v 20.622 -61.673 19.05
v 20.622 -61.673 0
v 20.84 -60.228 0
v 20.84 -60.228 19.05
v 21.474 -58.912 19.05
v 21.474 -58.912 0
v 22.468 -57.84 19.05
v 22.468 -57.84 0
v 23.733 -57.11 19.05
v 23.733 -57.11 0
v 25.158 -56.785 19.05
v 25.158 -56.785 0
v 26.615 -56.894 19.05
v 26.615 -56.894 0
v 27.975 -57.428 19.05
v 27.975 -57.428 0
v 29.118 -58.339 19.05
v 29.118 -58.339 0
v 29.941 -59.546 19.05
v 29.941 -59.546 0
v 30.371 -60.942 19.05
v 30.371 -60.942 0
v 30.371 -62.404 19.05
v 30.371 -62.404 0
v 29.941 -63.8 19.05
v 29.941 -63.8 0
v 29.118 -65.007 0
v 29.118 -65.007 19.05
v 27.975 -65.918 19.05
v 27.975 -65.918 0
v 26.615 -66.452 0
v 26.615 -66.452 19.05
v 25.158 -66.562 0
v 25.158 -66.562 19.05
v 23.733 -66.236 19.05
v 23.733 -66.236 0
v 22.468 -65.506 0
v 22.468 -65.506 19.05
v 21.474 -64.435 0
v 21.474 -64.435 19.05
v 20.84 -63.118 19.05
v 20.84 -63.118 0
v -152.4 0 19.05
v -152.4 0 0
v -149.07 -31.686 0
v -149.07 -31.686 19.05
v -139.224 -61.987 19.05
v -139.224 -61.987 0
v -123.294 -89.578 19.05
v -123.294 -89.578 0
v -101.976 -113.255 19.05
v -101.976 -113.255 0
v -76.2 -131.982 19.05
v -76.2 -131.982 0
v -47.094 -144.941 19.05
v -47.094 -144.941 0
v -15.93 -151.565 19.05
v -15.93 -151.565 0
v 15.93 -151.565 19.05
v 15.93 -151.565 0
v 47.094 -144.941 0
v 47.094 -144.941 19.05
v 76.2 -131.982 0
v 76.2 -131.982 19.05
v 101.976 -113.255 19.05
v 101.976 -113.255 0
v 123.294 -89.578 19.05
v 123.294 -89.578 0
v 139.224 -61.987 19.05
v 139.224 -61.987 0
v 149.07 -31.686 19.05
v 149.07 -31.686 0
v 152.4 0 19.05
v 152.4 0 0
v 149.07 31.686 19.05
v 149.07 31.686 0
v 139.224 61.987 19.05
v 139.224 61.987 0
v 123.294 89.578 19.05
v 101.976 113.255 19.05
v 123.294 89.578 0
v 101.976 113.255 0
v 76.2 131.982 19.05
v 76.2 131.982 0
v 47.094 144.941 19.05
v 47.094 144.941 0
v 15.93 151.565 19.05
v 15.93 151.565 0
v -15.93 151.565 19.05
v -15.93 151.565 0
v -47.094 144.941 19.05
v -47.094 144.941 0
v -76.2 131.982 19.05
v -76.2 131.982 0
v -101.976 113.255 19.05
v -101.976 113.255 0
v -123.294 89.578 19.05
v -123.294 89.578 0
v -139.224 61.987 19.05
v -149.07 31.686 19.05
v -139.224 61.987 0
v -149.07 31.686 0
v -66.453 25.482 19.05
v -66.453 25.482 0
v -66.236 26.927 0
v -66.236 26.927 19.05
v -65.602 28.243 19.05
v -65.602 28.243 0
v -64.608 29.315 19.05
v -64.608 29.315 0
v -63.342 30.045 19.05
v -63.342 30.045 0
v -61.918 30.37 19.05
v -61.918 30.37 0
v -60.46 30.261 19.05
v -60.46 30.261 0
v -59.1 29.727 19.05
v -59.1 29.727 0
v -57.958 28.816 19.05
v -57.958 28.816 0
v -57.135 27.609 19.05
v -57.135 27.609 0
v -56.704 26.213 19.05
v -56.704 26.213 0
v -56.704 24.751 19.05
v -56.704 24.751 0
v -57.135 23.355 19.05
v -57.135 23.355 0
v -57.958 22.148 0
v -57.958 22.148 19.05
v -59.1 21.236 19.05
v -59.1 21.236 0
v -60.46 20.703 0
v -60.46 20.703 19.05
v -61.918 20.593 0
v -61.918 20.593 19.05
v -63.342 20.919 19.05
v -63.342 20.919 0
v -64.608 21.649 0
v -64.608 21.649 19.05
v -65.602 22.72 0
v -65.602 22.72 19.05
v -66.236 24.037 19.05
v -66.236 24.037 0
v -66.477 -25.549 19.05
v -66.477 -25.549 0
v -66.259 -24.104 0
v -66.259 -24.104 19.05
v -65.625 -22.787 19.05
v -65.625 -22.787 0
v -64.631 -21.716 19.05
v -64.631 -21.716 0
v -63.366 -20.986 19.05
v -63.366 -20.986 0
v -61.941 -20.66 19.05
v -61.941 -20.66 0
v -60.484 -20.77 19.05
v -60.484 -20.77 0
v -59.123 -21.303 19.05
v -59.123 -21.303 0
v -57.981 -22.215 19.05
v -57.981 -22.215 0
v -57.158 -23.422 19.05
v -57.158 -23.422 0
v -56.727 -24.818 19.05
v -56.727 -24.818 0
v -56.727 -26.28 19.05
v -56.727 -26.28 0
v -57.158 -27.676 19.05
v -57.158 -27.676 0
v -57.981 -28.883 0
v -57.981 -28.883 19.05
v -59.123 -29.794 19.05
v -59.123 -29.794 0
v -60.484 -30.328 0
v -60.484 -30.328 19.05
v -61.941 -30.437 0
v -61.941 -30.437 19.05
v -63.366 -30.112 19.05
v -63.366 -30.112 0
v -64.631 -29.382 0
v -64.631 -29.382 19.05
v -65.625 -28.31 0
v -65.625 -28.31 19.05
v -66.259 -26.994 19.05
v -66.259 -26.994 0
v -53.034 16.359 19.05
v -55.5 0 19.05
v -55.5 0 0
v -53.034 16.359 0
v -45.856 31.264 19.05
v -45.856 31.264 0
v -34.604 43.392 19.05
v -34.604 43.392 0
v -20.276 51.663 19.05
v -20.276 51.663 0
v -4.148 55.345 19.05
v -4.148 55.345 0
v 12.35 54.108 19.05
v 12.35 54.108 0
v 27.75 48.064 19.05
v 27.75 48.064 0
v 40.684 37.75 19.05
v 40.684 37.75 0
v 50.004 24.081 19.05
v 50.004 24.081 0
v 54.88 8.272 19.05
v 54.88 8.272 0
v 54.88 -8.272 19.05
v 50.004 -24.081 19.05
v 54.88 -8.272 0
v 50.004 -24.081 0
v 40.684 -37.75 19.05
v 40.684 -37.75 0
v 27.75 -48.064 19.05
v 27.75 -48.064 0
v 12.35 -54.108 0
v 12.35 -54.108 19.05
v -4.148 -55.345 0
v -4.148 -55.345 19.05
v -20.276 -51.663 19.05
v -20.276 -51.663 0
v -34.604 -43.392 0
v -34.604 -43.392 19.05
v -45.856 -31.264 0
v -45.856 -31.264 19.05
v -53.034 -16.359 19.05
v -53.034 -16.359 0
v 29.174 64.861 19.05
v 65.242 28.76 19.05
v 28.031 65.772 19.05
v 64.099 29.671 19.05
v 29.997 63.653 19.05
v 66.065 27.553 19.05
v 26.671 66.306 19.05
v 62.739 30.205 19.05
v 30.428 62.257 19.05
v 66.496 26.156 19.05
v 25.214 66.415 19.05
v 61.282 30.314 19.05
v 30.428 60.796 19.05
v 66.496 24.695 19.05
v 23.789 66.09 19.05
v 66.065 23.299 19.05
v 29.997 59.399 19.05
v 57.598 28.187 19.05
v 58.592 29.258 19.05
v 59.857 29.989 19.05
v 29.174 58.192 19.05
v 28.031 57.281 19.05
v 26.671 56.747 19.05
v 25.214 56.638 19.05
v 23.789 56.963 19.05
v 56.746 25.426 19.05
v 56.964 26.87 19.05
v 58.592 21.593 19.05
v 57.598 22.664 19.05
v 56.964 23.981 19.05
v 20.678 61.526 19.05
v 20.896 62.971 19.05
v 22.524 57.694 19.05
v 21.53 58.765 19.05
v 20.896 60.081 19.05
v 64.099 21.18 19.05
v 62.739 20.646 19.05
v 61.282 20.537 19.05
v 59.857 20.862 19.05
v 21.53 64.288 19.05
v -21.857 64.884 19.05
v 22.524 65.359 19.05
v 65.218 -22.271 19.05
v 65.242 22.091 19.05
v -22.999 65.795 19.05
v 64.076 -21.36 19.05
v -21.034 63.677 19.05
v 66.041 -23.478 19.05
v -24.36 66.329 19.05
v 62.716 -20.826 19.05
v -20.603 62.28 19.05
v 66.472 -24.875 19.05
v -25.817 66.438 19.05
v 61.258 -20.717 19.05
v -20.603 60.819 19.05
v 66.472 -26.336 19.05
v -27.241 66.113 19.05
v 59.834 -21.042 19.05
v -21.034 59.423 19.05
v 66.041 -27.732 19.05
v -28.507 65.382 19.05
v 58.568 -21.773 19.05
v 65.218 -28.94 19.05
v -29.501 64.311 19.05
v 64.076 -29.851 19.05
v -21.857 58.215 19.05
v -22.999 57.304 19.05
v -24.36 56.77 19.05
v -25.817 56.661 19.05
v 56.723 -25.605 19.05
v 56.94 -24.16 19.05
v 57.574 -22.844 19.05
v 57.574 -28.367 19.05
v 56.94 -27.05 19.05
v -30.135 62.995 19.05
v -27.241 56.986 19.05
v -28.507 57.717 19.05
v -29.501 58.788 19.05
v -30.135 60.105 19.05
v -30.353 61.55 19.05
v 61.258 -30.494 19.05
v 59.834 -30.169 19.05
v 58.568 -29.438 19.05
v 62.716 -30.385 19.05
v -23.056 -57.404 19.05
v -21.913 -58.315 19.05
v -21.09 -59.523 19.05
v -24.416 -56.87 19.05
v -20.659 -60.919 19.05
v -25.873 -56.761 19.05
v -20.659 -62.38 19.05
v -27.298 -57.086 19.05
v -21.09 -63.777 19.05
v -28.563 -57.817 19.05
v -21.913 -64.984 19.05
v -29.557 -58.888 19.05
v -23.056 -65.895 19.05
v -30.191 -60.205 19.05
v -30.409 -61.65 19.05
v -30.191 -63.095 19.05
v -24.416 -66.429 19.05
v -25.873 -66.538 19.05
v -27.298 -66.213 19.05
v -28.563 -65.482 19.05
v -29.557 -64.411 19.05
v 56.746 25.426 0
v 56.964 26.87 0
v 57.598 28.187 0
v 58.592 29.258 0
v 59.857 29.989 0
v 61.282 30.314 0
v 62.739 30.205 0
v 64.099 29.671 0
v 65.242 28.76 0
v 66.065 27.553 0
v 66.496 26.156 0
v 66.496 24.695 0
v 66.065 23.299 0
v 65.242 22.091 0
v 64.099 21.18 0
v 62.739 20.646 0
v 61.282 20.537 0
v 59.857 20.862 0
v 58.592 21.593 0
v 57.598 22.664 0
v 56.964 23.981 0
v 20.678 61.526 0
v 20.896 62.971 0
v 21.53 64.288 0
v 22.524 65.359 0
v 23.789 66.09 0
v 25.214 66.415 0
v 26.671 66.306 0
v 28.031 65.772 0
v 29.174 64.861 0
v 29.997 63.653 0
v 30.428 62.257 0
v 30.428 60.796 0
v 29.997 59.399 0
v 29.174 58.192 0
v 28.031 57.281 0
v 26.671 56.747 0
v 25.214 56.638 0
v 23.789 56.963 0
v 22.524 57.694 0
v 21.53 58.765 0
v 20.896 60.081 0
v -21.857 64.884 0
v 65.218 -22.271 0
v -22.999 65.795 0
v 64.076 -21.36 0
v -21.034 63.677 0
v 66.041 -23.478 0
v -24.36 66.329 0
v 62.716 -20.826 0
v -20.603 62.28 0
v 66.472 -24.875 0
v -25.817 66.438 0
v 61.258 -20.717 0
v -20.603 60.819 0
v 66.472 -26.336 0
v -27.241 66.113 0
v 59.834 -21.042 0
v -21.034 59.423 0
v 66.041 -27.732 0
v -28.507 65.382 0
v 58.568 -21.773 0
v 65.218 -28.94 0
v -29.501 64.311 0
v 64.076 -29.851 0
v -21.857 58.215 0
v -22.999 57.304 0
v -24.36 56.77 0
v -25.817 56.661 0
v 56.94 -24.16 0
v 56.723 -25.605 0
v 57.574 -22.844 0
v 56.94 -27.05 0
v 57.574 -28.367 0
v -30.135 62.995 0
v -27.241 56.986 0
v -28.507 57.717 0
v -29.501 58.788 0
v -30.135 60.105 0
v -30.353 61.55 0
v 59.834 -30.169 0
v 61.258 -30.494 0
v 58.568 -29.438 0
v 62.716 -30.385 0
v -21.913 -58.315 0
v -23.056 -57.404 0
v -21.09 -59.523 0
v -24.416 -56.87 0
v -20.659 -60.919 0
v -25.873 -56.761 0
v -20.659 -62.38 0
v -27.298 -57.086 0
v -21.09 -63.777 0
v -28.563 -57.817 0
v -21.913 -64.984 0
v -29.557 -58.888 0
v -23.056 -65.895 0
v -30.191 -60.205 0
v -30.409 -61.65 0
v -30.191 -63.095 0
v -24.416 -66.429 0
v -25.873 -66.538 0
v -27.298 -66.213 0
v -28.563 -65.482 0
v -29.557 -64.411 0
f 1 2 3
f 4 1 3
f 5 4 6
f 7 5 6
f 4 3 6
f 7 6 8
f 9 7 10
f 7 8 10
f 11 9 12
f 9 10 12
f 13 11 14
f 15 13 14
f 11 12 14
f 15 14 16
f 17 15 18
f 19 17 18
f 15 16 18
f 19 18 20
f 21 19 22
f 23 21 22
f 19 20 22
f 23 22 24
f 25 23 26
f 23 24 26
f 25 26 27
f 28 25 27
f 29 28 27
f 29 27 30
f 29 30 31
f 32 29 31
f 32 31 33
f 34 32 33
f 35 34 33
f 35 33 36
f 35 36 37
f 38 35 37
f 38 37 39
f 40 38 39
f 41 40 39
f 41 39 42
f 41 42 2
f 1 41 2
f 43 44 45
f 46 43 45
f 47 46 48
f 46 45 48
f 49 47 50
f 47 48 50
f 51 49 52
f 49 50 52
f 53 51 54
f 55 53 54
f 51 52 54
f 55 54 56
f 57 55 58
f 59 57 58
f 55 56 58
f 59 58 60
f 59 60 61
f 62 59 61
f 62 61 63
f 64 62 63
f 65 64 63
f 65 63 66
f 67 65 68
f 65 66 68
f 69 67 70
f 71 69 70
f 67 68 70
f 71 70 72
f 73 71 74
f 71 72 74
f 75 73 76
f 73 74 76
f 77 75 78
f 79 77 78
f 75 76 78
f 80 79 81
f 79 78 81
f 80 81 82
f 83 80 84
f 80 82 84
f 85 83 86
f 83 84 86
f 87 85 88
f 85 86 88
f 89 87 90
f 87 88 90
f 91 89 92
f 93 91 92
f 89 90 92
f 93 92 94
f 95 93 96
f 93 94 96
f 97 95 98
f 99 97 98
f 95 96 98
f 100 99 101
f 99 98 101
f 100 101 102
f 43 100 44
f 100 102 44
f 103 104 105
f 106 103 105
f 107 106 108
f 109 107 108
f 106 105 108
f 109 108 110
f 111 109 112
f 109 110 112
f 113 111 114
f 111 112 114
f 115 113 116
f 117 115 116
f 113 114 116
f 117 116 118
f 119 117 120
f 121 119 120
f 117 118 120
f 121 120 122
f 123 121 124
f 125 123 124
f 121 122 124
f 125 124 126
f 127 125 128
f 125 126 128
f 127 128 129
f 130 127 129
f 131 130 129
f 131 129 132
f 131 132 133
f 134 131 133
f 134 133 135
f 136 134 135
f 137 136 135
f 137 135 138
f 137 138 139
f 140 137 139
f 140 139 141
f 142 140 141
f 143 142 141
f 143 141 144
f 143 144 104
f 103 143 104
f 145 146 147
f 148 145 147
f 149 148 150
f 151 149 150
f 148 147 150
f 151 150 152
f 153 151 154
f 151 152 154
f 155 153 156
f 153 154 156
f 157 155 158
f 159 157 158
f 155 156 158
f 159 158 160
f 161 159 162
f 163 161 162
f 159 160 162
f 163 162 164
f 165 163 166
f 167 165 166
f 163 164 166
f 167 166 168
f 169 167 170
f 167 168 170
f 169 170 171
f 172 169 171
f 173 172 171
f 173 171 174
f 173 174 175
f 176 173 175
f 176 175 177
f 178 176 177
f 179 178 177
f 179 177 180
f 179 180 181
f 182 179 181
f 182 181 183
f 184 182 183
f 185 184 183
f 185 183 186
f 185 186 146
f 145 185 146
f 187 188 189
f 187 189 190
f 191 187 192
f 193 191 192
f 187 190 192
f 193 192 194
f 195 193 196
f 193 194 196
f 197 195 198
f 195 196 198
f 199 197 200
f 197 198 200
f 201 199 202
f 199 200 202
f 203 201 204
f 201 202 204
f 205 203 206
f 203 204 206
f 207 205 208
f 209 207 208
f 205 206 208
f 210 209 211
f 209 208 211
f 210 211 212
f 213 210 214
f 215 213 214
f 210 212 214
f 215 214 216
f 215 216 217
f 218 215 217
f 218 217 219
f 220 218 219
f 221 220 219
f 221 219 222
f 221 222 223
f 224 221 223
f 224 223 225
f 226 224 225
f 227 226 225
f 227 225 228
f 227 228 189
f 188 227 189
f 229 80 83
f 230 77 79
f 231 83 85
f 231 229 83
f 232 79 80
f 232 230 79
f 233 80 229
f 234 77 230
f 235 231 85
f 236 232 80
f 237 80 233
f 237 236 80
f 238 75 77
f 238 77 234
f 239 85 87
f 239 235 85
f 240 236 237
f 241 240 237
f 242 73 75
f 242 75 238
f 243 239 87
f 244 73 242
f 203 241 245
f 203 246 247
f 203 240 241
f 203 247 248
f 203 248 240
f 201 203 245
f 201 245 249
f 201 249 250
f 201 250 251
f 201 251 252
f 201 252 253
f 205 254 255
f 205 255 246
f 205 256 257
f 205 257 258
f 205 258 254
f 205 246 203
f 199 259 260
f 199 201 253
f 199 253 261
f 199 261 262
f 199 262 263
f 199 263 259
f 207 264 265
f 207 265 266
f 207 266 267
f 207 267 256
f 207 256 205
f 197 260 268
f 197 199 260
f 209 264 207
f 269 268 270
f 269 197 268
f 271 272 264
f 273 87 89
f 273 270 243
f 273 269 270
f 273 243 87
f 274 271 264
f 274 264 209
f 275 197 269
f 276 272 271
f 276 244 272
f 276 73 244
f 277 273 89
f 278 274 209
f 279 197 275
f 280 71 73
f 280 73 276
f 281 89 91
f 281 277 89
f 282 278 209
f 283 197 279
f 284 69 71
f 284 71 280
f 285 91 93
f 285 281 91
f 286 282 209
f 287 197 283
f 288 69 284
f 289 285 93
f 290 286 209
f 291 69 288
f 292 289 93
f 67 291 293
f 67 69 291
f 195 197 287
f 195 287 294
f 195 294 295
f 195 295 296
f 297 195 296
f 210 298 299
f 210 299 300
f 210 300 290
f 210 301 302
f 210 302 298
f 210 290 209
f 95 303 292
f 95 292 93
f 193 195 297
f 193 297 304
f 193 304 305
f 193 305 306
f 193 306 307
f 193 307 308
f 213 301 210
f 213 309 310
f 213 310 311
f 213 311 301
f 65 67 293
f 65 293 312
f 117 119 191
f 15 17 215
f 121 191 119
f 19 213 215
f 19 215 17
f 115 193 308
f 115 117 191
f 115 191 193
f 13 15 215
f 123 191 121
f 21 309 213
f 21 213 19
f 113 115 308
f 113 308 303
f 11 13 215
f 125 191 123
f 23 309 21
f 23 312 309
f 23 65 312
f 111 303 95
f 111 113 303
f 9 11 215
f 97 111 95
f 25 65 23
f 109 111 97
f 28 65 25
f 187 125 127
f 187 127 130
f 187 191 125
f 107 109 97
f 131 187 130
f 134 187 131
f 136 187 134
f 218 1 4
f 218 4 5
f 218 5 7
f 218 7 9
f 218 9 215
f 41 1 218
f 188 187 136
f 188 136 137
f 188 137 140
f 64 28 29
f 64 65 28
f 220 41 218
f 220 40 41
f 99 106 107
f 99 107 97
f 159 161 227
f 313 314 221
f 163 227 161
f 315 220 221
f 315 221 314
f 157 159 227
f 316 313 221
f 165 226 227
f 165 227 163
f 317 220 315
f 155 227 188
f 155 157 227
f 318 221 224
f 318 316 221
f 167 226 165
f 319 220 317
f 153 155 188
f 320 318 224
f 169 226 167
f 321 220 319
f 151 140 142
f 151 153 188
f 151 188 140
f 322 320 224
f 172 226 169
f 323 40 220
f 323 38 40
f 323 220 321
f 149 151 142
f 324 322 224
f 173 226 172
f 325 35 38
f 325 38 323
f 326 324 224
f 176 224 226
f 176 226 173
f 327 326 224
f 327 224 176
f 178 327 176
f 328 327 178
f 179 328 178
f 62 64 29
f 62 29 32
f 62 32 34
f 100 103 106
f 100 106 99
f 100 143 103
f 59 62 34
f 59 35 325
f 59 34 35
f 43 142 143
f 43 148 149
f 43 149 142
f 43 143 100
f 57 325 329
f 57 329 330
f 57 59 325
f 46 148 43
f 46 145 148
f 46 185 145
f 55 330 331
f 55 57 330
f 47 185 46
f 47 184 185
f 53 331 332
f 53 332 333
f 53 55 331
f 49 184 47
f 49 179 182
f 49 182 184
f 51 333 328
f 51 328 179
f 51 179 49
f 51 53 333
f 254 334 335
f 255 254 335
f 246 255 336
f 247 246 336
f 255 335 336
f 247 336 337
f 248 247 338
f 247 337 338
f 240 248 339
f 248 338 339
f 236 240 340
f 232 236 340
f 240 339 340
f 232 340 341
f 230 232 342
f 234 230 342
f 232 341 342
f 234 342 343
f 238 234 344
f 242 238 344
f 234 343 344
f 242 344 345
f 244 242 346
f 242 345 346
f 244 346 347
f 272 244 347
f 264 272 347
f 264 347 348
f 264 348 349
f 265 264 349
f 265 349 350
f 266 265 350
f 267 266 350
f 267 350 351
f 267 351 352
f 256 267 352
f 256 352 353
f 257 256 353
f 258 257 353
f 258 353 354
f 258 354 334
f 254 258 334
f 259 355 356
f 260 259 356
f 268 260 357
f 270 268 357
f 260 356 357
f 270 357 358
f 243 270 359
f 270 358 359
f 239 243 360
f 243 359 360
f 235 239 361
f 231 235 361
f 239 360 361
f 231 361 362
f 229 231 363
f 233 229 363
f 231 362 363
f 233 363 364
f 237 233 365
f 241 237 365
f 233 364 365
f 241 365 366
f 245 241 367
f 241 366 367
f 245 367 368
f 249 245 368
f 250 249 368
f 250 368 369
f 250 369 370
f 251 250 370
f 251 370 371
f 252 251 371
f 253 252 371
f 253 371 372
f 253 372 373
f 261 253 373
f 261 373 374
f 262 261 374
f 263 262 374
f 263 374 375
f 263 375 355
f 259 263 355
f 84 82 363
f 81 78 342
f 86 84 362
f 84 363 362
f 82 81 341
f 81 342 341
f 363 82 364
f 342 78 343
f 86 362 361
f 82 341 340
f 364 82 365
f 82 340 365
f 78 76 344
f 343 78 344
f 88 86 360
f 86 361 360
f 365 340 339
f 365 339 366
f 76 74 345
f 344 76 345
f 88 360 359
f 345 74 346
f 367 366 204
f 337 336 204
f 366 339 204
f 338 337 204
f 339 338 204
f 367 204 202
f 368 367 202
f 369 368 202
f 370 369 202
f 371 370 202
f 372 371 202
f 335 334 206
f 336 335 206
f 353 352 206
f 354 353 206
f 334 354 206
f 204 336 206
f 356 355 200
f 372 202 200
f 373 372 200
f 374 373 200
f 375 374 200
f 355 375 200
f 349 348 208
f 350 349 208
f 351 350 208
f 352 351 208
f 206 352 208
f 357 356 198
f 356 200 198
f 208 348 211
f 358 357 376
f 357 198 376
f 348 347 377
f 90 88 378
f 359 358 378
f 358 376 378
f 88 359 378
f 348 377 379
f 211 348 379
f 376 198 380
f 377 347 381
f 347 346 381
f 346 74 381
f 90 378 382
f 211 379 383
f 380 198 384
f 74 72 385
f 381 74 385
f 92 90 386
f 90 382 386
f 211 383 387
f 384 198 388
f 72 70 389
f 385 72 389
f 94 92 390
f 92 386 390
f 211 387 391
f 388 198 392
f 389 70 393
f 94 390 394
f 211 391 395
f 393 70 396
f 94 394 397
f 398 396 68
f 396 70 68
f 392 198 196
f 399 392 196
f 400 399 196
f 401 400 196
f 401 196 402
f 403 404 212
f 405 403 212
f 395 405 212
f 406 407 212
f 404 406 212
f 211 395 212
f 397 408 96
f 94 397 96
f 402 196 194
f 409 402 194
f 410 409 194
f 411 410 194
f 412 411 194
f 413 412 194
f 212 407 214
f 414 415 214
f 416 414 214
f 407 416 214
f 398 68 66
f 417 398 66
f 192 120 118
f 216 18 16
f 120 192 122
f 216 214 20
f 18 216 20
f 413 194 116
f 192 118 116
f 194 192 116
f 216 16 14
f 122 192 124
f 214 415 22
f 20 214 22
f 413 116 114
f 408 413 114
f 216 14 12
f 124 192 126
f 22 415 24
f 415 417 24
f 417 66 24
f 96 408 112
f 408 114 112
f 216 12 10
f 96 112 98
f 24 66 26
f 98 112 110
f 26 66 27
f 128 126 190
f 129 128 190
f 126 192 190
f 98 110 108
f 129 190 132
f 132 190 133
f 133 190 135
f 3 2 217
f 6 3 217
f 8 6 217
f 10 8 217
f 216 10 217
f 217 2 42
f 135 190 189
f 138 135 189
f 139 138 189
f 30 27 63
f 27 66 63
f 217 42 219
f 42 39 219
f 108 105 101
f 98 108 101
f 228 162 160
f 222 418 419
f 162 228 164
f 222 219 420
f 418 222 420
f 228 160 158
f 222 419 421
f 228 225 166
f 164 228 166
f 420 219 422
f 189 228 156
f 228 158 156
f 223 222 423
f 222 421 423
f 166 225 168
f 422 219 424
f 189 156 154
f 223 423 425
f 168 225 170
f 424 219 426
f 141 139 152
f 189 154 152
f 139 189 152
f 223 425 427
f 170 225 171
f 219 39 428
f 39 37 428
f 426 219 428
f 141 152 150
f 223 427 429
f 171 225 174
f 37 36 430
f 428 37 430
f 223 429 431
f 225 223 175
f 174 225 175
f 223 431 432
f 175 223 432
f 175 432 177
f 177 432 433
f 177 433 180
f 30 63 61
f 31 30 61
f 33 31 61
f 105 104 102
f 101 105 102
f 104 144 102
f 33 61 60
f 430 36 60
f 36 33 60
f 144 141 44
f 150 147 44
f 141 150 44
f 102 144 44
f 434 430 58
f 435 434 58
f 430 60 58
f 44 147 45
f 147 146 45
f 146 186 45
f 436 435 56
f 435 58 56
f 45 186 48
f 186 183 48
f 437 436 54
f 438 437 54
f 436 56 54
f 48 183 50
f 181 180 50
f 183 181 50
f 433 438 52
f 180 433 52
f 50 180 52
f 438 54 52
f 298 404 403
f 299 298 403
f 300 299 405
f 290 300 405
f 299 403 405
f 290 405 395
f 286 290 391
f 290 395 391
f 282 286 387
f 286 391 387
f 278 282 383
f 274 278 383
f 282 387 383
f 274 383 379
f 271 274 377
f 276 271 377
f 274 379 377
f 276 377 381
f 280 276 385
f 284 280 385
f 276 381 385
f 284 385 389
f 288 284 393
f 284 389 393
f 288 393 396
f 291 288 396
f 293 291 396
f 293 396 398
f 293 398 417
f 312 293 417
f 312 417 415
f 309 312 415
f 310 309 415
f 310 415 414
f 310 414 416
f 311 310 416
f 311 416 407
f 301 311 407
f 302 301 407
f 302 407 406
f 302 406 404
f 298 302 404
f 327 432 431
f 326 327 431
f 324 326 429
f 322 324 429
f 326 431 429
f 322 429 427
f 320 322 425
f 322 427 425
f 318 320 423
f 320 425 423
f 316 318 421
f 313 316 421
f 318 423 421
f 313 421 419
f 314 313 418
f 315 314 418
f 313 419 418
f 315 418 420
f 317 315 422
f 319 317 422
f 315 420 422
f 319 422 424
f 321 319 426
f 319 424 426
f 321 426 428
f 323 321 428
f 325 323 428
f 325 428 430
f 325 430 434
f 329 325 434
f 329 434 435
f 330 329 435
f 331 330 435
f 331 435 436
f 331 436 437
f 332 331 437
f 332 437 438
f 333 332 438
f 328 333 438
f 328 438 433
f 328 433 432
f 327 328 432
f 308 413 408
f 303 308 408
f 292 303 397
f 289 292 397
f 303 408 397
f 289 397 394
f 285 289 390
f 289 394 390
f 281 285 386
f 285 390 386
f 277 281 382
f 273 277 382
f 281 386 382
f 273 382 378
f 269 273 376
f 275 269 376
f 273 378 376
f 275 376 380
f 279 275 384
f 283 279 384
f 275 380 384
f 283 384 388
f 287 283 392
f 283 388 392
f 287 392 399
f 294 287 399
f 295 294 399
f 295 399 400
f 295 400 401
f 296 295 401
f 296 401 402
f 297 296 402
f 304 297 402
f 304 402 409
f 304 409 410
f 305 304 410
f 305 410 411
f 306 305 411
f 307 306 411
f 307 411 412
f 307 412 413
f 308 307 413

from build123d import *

# Parameters (mm, degrees)
SKETCH1_R                  = 152.4
BOSS_EXTRUDE1_DEPTH        = 19.05
SKETCH5_R                  = 55
CUT_EXTRUDE1_DEPTH         = 217.366407975
F_3_8_CLEARANCE_HOLE1_D    = 9.8044
NIPPLE_SOCKET_CLEARANCE_BY = 0.5


with BuildPart() as part:
    # Sketch1 → Boss-Extrude1 (new body)
    with BuildSketch(Plane.XY):
        with Locations(Location((0, 0, 0), (0, 0, 180))):
            Circle(SKETCH1_R)
    extrude(amount=BOSS_EXTRUDE1_DEPTH)

    # Sketch5 → Cut-Extrude1 (cut, through all)
    with BuildSketch(Plane(origin=(0, 0, 0), x_dir=(-1, 0, 0), z_dir=(0, 0, -1))):
        Circle(SKETCH5_R)
    extrude(amount=-CUT_EXTRUDE1_DEPTH, mode=Mode.SUBTRACT)

    # 3/8 Clearance Hole1 (through all)
    with Locations(Plane.XY.offset(19.05)):
        with Locations((25.523973959, -61.673028045), (61.624734649, -25.605296339), (61.648089668, 25.425534023), (25.580357962, 61.526294713), (-25.450472399, 61.549649732), (-61.55123309, 25.481918026), (-61.574588109, -25.548912335), (-25.506856403, -61.649673026)):
            Hole(F_3_8_CLEARANCE_HOLE1_D / 2)

    # nipple-socket-clearance: a curved face moved inward by 0.5
    add(Solid.thicken(part.faces().sort_by_distance((55, 0, 9.525))[0], -NIPPLE_SOCKET_CLEARANCE_BY), mode=Mode.SUBTRACT)


solid = part.part
